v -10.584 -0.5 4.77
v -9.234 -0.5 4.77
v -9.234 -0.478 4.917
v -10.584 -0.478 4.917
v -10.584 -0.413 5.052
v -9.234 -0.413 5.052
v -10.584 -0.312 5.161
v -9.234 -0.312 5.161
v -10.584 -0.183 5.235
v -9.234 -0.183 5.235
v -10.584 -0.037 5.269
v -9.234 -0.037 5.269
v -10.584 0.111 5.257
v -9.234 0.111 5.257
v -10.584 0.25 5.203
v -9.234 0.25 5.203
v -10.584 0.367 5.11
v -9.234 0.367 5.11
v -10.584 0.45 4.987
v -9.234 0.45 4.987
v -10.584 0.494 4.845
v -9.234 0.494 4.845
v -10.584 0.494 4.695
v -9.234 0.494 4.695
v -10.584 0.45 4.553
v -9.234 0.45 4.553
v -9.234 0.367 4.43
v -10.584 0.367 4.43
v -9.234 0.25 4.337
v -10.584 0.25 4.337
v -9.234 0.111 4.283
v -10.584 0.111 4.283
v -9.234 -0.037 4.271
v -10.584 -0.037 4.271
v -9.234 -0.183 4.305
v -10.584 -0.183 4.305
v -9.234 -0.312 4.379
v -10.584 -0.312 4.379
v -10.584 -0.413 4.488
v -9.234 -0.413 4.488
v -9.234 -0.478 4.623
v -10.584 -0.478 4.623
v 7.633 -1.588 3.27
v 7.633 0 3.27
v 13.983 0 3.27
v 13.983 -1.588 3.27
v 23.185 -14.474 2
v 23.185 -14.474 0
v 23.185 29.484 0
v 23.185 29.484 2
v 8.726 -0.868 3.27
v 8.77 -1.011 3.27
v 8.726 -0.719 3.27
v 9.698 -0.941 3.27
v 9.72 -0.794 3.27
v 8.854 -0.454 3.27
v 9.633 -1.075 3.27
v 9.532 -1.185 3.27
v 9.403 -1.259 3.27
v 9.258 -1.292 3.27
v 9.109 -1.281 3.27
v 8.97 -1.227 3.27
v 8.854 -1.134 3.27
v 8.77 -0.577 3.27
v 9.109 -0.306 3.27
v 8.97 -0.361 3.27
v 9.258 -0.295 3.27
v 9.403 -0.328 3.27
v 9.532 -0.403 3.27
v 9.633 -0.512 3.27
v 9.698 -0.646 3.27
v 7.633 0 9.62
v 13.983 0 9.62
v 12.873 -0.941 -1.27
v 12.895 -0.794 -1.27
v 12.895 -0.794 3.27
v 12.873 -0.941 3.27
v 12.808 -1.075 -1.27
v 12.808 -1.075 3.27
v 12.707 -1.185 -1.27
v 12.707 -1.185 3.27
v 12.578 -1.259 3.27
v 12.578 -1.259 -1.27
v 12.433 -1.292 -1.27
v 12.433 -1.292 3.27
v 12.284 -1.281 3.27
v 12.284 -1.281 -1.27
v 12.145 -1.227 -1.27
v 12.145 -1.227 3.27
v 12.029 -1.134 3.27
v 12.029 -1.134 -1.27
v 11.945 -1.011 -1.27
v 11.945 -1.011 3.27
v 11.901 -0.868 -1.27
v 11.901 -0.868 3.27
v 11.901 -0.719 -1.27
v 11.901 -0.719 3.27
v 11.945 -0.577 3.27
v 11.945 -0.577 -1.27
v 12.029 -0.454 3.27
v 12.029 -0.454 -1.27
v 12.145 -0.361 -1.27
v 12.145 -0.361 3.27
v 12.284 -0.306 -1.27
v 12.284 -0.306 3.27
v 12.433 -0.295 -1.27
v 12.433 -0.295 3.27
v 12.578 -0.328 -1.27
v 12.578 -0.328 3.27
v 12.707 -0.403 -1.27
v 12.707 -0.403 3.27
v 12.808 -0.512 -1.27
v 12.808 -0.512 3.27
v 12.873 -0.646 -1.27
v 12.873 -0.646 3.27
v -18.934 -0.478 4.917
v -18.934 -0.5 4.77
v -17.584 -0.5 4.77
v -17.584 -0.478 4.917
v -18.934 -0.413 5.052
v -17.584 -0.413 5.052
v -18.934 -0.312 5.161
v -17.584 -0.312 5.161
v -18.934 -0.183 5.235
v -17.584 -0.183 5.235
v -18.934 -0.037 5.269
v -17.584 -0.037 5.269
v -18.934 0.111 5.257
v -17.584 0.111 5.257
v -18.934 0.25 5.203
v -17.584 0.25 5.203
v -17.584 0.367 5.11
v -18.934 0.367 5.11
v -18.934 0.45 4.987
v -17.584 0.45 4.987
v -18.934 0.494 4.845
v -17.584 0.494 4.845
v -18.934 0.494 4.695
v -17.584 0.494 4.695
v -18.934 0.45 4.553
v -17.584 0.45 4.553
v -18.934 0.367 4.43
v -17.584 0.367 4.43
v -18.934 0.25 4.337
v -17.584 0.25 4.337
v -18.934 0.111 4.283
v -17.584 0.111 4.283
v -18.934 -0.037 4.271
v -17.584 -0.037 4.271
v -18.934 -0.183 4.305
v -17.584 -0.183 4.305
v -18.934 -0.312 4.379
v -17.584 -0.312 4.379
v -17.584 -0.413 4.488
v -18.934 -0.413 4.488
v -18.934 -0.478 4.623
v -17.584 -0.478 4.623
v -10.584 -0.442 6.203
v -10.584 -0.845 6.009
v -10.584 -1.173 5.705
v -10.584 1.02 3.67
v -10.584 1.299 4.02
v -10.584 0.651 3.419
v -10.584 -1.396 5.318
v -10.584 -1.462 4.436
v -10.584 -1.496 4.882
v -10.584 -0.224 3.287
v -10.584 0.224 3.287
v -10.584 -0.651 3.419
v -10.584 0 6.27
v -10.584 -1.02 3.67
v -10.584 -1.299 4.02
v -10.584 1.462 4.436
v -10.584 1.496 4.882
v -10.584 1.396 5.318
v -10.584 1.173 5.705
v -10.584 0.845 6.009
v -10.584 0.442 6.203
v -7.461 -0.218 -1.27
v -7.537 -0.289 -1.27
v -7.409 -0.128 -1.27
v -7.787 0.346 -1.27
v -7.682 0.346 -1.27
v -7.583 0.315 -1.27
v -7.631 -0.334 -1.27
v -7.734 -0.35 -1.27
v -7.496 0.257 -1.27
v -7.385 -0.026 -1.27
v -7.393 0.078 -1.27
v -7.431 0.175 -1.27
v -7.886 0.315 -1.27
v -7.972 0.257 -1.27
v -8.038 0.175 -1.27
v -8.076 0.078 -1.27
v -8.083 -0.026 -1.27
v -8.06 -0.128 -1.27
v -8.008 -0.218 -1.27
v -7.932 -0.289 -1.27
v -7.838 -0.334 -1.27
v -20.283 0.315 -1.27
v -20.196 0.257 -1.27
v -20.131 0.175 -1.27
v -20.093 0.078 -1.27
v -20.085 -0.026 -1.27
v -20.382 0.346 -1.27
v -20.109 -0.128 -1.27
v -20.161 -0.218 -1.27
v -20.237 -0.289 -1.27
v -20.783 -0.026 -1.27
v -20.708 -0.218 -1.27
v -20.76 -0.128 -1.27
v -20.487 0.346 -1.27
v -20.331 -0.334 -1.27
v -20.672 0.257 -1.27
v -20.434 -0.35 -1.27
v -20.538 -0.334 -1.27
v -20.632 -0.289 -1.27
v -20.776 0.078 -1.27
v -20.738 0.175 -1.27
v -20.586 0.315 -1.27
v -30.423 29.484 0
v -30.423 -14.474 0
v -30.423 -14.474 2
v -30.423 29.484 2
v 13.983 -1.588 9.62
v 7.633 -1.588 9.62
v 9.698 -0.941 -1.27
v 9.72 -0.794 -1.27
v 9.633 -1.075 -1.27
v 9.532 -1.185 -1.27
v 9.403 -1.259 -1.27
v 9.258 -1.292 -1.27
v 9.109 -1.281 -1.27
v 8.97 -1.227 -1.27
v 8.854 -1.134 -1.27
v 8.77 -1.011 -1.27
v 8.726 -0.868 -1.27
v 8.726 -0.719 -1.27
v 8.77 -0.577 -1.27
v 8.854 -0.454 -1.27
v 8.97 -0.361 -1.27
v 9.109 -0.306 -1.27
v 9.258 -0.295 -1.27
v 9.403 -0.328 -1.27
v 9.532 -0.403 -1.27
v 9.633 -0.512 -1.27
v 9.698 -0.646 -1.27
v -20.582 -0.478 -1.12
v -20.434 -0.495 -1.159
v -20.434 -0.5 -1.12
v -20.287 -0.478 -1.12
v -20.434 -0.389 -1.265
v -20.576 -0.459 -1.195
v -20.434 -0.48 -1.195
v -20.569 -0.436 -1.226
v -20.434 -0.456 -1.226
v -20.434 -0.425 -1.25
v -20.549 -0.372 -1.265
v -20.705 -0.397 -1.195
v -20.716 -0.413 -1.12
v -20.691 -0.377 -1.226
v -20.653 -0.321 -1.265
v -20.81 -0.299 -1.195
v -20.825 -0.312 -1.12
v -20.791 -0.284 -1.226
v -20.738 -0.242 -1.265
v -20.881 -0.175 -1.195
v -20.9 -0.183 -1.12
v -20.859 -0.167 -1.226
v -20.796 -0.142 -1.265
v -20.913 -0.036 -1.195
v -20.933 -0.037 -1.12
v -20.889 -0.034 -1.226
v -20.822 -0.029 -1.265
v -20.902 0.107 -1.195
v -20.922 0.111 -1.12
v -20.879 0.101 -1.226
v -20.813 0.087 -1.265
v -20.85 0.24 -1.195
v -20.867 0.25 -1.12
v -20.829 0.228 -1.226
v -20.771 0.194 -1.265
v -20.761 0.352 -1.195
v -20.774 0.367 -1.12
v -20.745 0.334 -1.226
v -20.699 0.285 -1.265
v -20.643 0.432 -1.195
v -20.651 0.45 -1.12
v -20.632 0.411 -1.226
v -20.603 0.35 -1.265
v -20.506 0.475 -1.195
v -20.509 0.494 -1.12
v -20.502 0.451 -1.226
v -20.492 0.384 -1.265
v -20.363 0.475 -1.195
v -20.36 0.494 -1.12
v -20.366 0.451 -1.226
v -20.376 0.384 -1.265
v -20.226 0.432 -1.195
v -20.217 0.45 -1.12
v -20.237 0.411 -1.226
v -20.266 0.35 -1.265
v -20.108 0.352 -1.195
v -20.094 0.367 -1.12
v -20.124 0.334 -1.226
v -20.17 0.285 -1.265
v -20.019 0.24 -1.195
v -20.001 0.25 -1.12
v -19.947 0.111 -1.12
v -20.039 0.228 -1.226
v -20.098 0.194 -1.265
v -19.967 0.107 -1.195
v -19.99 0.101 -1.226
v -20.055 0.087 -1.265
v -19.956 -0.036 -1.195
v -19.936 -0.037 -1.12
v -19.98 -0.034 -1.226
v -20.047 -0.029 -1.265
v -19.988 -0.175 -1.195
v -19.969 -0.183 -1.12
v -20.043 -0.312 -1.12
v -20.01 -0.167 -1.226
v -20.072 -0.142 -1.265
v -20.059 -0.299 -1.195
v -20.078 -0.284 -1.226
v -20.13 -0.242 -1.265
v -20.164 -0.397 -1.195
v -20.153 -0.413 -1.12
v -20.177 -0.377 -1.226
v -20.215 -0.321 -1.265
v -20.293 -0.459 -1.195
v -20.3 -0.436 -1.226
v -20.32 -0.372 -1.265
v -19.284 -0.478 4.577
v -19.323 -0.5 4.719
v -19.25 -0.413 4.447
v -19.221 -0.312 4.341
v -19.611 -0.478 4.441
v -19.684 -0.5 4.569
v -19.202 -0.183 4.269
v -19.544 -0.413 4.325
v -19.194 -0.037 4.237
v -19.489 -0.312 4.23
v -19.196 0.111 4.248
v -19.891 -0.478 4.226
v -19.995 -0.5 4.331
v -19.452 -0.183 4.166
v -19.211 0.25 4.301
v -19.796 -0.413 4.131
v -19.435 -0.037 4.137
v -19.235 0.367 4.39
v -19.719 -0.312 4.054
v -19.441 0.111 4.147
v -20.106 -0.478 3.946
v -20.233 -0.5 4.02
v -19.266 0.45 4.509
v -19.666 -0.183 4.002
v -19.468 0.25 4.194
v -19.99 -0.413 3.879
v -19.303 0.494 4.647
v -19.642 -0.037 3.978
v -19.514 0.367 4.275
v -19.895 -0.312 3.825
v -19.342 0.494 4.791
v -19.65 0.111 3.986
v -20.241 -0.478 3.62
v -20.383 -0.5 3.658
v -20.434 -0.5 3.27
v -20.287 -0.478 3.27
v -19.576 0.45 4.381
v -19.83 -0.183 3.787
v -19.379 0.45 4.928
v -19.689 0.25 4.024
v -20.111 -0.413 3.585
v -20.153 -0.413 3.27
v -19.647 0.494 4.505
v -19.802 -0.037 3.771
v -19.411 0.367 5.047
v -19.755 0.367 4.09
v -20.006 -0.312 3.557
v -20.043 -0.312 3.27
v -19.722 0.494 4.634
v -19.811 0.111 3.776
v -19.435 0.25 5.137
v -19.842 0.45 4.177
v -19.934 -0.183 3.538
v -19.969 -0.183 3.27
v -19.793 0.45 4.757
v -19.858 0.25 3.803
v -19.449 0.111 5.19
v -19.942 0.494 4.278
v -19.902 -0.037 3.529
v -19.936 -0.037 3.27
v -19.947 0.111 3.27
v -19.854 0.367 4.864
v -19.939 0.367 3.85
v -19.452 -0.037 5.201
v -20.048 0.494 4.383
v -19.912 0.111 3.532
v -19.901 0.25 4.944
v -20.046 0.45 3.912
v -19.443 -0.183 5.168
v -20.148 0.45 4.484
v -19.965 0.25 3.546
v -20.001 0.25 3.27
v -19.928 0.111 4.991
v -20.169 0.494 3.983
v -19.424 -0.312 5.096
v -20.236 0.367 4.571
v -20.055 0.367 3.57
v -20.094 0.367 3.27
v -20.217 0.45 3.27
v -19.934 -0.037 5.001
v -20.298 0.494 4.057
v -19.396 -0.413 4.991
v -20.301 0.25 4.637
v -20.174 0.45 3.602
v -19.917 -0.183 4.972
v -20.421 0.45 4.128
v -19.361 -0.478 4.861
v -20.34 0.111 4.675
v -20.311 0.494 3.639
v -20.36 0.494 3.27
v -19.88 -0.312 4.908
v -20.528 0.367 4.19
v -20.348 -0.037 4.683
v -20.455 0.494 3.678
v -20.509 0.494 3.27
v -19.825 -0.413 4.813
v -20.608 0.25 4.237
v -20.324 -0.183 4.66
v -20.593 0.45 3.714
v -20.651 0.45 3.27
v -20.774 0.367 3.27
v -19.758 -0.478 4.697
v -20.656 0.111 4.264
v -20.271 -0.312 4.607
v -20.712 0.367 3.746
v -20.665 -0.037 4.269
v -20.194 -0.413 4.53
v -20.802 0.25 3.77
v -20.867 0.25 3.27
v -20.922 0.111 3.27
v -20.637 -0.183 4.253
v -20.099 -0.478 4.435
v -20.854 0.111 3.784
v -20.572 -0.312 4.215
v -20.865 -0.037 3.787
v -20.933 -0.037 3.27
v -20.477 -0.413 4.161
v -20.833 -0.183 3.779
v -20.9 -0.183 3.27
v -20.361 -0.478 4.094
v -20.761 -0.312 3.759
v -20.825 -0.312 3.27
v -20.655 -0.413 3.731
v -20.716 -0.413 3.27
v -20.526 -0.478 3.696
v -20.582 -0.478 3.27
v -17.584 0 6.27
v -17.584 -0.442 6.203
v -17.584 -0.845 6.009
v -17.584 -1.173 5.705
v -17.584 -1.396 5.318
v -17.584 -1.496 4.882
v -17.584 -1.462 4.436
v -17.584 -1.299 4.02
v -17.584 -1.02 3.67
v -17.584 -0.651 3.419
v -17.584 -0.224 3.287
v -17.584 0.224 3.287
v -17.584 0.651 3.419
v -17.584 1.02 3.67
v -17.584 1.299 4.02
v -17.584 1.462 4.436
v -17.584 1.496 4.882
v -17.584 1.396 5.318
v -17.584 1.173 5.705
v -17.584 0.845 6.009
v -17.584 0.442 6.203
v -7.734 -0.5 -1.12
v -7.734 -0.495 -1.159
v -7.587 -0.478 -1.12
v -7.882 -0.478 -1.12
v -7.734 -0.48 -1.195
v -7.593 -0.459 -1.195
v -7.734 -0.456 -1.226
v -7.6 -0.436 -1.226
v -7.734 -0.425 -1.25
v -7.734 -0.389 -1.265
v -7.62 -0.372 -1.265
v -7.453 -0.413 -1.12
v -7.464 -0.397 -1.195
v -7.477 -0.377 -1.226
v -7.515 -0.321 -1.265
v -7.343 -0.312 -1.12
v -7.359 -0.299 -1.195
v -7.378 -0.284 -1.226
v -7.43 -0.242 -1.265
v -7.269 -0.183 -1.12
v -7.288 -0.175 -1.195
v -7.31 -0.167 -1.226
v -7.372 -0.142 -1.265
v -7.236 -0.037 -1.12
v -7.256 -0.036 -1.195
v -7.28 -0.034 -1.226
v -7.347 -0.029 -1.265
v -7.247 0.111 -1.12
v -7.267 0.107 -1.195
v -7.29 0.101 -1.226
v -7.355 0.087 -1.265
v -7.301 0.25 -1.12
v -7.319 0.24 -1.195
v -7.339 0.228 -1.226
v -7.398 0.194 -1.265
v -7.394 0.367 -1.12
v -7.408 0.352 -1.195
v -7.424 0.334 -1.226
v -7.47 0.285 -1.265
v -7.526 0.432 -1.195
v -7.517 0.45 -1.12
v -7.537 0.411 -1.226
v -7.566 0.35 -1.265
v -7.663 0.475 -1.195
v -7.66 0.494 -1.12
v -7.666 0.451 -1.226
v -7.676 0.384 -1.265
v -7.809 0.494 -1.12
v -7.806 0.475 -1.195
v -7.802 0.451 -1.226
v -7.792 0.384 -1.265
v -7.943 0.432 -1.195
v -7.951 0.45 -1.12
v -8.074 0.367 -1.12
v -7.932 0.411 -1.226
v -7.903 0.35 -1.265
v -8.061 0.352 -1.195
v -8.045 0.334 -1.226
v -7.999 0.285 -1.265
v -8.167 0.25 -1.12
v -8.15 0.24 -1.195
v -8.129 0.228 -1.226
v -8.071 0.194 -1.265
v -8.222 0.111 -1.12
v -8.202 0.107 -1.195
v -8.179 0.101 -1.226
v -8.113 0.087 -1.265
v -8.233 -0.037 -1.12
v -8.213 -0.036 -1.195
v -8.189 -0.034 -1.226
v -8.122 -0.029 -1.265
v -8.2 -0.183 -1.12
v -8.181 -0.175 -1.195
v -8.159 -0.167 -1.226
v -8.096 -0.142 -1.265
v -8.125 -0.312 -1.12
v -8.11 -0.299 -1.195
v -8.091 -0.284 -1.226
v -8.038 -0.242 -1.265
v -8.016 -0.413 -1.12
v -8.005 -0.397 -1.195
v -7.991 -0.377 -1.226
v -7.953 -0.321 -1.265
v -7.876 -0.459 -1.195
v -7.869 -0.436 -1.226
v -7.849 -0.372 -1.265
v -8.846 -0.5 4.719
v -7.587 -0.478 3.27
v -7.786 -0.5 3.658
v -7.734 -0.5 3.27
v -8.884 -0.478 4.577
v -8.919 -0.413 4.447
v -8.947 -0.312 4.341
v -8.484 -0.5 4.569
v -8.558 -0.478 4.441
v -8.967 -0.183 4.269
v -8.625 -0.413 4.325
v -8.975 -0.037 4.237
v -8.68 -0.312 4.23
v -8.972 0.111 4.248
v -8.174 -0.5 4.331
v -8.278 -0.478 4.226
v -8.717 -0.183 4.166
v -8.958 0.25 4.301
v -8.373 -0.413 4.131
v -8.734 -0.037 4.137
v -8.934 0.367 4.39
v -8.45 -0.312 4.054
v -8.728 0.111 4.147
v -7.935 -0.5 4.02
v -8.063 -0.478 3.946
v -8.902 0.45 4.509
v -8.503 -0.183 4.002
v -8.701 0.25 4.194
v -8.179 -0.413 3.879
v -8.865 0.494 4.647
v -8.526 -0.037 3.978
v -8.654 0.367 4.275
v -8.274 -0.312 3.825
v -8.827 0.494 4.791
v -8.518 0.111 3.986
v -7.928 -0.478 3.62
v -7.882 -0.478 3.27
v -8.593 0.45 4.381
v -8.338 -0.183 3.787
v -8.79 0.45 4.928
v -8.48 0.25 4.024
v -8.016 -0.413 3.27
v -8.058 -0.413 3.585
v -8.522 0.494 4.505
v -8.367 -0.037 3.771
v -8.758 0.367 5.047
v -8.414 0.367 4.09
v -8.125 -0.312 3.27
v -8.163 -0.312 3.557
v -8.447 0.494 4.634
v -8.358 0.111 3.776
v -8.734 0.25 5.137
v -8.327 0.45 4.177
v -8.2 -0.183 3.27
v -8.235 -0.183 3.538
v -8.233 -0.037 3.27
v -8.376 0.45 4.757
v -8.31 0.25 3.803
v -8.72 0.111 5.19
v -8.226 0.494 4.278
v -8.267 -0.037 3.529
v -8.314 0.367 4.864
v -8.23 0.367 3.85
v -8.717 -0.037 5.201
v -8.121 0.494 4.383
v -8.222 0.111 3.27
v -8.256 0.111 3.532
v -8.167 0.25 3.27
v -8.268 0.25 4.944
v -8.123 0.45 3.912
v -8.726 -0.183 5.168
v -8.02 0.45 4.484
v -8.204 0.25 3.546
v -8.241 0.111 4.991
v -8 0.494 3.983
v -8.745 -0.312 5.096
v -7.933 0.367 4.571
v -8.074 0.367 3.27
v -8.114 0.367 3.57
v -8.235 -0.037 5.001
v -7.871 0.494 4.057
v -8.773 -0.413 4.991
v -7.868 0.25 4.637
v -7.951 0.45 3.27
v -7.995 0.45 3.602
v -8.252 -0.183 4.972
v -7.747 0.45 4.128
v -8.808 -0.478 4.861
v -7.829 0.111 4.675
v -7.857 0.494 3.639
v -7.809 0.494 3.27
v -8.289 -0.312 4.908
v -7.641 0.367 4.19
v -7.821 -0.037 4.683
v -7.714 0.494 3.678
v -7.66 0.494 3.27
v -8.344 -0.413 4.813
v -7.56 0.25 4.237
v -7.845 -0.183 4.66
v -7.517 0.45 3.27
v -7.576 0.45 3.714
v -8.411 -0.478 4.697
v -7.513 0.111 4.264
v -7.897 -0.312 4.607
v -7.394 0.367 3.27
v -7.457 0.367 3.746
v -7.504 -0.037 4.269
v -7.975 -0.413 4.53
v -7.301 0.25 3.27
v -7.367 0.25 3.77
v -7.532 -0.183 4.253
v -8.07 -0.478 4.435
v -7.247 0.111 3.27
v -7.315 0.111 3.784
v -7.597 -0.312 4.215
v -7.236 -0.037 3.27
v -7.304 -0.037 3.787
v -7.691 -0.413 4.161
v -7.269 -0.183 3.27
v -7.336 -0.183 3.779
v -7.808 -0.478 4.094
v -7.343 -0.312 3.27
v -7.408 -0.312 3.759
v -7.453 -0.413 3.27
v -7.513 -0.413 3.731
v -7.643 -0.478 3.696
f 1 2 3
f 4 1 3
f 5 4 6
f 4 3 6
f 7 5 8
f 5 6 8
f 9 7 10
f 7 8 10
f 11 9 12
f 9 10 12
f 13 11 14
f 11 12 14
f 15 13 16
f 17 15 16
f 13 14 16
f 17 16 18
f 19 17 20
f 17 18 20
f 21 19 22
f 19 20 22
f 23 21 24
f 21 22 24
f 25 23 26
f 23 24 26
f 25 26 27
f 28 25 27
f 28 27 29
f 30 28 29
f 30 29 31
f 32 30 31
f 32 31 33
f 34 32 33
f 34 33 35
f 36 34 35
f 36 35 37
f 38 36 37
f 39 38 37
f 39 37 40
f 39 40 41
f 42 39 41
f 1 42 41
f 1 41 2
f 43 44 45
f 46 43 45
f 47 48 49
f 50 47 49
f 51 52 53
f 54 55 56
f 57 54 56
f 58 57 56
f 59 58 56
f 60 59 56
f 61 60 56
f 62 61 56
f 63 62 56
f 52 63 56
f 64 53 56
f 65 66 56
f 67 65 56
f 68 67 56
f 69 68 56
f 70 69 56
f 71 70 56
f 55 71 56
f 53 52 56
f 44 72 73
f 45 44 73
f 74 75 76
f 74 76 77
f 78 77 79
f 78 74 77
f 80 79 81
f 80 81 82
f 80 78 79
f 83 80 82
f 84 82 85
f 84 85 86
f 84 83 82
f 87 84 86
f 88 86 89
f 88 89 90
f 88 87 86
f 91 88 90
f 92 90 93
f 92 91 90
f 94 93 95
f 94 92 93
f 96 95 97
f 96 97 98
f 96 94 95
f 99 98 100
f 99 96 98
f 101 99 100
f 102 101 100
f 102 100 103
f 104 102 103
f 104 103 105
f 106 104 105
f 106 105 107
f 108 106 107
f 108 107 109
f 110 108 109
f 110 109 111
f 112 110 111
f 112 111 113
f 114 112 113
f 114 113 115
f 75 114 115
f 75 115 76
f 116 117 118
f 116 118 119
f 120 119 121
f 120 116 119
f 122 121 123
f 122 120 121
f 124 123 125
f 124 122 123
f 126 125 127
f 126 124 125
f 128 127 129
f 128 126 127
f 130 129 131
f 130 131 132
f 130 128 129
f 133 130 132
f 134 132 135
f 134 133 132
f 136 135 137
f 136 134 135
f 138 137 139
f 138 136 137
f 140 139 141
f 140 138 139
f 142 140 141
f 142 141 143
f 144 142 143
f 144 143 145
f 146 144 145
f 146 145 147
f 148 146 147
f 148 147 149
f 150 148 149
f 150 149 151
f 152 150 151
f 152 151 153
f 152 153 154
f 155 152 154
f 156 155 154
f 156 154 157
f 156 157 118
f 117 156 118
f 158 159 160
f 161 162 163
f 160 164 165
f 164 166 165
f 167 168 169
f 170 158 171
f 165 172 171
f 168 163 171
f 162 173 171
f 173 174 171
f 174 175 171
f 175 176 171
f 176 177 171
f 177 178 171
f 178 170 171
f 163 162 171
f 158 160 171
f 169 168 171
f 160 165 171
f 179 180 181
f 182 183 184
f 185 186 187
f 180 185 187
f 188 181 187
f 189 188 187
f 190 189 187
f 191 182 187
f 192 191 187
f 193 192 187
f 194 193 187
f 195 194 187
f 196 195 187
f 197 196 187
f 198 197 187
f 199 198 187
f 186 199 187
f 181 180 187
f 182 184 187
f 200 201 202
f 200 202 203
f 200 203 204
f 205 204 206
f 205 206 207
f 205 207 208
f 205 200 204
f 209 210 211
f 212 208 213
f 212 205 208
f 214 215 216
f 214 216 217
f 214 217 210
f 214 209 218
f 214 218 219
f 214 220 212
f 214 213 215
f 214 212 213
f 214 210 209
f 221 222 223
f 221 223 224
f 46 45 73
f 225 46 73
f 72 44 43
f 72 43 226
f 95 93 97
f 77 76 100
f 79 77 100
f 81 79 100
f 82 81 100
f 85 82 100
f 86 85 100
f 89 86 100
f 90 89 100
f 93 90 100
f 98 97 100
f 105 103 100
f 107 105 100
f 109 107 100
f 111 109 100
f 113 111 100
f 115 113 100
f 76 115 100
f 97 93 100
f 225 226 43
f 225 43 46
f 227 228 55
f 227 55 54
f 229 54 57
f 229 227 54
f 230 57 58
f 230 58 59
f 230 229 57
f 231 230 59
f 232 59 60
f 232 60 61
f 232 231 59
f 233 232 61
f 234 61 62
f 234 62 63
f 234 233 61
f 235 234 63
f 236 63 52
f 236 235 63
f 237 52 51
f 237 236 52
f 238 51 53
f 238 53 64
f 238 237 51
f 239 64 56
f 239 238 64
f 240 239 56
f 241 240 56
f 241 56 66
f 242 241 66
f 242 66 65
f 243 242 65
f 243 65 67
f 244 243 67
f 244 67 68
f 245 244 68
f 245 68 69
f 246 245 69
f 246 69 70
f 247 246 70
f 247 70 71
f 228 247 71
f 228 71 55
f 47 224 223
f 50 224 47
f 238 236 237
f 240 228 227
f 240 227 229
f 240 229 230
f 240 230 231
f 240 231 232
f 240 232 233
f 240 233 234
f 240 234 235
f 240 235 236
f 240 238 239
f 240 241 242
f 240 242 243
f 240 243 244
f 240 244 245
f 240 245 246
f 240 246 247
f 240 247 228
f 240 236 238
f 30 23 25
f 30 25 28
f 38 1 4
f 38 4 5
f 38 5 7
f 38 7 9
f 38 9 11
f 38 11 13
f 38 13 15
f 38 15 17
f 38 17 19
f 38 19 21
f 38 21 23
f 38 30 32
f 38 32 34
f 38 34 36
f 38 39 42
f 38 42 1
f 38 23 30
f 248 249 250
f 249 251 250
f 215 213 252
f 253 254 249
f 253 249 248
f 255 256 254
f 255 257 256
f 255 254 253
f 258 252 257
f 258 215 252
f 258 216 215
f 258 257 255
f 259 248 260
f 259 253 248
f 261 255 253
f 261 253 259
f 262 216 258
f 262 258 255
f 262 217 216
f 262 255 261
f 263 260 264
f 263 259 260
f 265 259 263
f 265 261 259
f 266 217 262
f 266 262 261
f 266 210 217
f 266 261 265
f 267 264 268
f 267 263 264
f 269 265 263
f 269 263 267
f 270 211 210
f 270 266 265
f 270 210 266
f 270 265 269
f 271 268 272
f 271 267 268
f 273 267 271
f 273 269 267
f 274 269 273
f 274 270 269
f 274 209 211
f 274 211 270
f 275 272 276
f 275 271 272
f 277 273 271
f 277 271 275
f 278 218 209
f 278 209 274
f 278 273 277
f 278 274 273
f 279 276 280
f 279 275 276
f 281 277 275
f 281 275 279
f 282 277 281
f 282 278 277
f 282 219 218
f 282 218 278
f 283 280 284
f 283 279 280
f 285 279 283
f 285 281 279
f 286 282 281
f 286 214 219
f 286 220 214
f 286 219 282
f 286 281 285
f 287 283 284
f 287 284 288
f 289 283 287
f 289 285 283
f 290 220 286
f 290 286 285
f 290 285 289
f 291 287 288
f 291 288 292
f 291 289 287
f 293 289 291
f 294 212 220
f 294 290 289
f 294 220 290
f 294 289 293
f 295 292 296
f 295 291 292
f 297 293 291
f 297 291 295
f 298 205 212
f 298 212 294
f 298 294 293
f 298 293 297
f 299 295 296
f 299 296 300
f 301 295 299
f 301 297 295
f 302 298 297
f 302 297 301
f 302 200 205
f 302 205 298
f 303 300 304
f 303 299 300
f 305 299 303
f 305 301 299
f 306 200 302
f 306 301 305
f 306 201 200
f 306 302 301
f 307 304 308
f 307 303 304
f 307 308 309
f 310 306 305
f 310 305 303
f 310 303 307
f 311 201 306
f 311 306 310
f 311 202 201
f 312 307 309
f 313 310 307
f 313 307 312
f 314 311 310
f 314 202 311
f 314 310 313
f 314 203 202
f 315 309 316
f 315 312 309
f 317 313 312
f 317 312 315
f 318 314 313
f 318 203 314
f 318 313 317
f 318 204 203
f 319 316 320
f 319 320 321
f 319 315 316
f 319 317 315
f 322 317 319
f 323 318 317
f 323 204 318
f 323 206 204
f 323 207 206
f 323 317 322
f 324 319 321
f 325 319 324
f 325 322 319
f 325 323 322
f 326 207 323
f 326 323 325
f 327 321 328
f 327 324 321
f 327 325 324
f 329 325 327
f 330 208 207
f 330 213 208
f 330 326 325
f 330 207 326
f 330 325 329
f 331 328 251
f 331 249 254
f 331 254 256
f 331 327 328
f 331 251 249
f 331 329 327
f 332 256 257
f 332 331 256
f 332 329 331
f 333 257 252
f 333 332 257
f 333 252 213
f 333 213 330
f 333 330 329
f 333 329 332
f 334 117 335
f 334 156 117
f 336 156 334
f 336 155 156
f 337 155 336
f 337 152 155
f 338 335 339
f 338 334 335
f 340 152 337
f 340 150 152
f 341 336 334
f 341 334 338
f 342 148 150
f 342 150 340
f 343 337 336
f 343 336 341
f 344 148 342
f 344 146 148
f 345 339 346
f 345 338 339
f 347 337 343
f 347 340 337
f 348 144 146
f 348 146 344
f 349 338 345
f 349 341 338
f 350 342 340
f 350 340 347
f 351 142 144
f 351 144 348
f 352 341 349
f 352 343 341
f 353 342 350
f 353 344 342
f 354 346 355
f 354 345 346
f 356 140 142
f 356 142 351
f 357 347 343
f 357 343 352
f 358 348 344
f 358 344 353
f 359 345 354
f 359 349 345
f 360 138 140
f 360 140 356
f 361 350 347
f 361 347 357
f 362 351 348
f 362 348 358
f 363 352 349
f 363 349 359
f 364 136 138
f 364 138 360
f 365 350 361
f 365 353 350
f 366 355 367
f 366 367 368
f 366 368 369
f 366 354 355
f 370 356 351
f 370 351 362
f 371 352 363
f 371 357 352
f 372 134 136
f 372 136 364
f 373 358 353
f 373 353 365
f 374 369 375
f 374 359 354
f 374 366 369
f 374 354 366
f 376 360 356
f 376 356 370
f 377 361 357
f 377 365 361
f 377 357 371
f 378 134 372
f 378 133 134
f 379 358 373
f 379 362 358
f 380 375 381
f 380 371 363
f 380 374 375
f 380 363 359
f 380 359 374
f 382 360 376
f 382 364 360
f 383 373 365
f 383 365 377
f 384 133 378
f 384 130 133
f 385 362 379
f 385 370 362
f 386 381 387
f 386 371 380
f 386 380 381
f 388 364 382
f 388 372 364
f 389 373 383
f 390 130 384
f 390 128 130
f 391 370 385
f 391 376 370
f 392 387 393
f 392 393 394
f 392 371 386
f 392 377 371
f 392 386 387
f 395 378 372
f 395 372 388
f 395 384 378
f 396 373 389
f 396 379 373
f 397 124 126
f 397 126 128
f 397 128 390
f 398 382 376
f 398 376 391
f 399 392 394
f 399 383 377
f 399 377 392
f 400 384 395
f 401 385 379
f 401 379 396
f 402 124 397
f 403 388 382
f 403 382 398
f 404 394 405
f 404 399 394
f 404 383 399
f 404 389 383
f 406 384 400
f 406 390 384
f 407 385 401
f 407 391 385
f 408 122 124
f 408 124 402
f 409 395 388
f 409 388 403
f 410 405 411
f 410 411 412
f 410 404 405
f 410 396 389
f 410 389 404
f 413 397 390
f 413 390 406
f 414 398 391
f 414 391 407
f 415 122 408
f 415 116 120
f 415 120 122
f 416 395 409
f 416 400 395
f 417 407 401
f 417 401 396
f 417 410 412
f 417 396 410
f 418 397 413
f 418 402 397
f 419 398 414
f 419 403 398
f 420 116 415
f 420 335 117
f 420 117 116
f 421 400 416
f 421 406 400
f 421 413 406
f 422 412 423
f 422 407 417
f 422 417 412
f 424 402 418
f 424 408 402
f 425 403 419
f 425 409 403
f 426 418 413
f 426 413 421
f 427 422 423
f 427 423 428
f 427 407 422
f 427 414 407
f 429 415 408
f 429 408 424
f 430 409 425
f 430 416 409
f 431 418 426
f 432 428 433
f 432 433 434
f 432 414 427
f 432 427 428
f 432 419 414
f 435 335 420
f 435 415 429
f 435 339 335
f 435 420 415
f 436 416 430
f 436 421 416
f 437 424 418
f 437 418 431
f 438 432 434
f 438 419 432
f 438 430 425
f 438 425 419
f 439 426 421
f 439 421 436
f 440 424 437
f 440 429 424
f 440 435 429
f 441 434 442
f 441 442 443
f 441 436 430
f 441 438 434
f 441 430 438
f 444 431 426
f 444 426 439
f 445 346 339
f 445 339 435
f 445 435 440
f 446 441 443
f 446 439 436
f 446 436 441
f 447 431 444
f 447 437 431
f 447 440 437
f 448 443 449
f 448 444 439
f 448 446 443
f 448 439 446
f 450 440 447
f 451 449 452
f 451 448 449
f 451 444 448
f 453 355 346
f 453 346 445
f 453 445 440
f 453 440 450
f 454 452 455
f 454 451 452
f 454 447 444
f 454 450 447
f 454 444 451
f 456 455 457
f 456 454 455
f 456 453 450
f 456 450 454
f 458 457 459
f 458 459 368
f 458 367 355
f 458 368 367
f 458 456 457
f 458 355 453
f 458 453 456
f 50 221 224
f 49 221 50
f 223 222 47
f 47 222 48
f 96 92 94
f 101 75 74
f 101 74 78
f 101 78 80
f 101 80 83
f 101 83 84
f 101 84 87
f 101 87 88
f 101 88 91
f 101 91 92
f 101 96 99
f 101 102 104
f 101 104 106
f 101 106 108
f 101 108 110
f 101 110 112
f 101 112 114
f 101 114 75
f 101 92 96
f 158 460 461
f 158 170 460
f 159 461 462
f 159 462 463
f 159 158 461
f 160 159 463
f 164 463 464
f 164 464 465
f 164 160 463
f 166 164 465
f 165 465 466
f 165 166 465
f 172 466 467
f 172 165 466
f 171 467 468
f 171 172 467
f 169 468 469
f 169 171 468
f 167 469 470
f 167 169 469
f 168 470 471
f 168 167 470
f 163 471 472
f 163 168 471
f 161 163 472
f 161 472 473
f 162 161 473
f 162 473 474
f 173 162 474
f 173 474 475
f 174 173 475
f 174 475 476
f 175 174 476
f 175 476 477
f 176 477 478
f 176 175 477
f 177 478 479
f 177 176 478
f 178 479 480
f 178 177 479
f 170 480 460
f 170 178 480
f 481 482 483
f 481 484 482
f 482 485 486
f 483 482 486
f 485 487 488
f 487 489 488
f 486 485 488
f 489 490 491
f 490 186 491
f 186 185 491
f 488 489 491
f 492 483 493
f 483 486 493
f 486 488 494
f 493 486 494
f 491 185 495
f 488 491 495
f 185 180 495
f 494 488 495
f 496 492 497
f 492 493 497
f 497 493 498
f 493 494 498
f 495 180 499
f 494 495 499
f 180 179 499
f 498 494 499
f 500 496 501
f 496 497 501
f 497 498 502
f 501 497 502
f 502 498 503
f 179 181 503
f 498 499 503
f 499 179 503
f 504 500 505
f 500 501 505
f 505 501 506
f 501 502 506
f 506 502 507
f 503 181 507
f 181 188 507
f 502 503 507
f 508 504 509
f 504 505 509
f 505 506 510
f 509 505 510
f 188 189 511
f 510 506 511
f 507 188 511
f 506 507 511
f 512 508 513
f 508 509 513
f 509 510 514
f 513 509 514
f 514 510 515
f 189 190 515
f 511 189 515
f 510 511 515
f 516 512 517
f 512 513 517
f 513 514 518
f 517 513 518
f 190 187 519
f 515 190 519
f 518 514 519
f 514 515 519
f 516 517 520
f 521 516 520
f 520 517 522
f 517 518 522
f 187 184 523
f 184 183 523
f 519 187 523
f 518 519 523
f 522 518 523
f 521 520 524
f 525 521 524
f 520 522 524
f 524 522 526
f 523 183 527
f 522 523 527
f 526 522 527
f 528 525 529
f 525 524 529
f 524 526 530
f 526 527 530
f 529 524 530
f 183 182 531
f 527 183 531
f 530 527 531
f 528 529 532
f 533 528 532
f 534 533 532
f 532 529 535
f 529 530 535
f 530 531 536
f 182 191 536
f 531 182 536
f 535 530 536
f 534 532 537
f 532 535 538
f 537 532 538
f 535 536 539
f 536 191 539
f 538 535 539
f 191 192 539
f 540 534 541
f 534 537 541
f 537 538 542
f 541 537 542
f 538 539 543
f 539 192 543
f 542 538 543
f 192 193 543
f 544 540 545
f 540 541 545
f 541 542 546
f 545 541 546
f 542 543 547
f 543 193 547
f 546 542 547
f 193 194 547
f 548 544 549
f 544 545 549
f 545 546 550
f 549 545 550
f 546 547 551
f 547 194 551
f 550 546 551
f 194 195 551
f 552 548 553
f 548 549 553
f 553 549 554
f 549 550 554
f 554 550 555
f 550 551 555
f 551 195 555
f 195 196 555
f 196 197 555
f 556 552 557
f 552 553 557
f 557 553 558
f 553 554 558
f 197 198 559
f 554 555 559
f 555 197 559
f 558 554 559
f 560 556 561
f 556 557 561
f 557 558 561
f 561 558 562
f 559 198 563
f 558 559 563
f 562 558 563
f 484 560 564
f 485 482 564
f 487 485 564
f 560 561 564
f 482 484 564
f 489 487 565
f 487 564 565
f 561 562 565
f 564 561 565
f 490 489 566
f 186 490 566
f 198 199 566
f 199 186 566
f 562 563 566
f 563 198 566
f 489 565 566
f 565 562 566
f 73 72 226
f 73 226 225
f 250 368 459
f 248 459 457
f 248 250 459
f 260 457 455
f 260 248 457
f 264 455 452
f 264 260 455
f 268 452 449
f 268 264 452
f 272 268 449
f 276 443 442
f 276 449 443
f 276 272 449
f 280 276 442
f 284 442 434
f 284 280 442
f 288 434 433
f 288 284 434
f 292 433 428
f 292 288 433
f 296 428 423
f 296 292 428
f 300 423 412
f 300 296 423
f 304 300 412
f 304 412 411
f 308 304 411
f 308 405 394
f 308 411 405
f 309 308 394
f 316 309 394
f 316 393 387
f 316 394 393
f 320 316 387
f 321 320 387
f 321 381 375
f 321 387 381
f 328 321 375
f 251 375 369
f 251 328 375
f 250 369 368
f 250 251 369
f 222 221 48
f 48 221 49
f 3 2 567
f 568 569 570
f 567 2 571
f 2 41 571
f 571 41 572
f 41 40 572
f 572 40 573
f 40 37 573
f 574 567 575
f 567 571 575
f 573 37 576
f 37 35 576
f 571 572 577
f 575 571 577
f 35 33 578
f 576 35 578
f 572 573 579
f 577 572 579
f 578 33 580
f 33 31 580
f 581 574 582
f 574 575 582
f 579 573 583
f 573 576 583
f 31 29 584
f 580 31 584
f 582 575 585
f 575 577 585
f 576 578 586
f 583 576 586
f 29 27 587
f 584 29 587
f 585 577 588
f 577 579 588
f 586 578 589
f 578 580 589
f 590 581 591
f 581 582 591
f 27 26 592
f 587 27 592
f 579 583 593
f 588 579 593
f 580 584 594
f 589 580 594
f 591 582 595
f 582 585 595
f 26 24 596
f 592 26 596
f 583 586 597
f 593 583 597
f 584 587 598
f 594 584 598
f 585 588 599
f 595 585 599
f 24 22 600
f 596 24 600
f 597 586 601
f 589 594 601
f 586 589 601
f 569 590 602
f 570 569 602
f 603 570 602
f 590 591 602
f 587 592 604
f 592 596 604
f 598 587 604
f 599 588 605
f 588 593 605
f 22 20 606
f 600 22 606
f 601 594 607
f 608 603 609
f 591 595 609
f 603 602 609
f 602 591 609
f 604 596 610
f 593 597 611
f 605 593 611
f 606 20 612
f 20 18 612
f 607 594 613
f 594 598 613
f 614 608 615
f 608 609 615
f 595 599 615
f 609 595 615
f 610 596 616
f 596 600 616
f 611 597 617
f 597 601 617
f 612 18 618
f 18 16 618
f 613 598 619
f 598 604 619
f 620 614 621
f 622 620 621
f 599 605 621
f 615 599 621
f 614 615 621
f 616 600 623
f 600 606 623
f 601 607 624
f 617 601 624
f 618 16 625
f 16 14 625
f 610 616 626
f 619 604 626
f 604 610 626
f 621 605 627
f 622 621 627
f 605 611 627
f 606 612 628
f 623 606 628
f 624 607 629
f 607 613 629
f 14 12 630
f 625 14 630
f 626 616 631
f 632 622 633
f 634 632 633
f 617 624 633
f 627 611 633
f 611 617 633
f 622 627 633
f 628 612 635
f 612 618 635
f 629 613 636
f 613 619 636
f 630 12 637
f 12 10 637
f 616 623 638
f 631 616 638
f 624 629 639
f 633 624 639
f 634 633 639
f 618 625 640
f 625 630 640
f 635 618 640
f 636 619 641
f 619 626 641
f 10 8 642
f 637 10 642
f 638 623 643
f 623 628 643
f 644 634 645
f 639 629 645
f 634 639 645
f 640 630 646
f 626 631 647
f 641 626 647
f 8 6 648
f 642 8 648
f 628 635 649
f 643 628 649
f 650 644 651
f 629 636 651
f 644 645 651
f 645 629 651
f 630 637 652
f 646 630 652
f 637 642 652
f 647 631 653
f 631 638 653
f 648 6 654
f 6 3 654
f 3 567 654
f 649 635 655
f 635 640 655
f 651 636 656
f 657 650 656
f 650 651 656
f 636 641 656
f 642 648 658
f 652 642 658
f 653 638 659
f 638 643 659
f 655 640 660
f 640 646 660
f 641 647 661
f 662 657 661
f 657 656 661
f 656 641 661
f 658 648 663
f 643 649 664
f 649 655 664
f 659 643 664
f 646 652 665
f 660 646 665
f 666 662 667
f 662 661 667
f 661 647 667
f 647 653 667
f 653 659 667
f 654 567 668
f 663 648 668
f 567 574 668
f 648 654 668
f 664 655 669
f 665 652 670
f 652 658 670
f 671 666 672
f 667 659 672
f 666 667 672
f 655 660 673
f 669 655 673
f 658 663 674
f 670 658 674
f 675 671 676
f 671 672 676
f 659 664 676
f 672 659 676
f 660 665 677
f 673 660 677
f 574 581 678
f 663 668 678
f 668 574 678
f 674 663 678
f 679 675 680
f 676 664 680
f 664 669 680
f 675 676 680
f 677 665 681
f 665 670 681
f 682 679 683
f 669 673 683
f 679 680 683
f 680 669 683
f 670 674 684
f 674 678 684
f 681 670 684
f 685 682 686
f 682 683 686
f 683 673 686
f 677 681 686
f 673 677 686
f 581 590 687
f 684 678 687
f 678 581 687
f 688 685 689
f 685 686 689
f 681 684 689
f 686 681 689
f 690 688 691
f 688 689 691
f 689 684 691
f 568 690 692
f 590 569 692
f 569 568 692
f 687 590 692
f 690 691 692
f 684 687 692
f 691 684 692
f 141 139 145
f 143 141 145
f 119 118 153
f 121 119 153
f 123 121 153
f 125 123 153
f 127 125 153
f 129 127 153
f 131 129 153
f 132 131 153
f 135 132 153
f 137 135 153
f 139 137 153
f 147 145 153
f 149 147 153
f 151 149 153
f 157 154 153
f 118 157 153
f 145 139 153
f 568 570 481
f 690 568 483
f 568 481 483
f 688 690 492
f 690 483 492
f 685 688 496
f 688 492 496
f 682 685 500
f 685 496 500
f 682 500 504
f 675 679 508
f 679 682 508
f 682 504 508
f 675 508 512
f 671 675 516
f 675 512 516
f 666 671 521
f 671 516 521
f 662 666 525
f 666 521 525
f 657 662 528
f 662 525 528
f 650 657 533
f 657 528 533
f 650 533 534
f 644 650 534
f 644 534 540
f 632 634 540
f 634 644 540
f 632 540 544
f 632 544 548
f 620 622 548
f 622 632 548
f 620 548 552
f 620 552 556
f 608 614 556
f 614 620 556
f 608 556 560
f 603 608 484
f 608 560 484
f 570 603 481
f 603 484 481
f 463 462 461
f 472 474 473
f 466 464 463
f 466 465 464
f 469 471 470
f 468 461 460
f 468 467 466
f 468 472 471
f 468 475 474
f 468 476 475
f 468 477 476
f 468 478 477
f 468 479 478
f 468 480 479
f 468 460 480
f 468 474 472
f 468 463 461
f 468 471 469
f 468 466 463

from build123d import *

# Parameters (mm, degrees)
F0_W      = 53.608039394
F0_H      = 43.9585913264
F1_DEPTH  = 2
F2_W      = 7
F2_H      = 1.5
F4_R      = 0.5
F7_R      = 0.15
F10_W     = 6.35
F10_H     = 6.35
F11_DEPTH = 1.5875
F12_R     = 0.5


# Not quite as in the source:
# - a length typed as a fraction of an inch, garbled in the dataset ("3 / 203.2 mm" for 3/8 in), is restored


with BuildPart() as f1:
    # F0 (on Top) → F1 (new body)
    with BuildSketch(Plane.XY):
        with Locations((-3.6185430363, 7.5051253516)):
            Rectangle(F0_W, F0_H)
    extrude(amount=F1_DEPTH)


with BuildPart() as f3:
    # F2 (on Front) → F3 (revolve)
    with BuildSketch(Plane.XZ):
        with Locations((-14.0843965262, 5.52)):
            Rectangle(F2_W, F2_H)
    revolve(axis=Axis((-14.0843965262, 0, 4.77), (1, 0, 0)))


with BuildPart() as f6:
    # F6: sweep along a path in F5
    with BuildLine(Plane.XZ) as f6_path:
        Line((-17.5843965262, 4.77), (-18.9343965262, 4.77))
        ThreePointArc((-18.9343965262, 4.77), (-19.995056698, 4.3306601718), (-20.4343965262, 3.27))
        Line((-20.4343965262, 3.27), (-20.4343965262, -1.27))
    # F4 (on face) → F6 (sweep)
    with BuildSketch(Plane(origin=(-17.5843965262, 0, 0), x_dir=(0, -1, 0), z_dir=(-1, 0, 0))):
        with Locations((0, 4.77)):
            Circle(F4_R)
    sweep(path=f6_path.line)

    # F7
    f7_edges = [f6.edges().sort_by_distance(p)[0] for p in [
        (-20.434397, 0.5, -1.27),
    ]]
    fillet(f7_edges, radius=F7_R)


with BuildPart() as f9_1:
    # F9: instance of F6
    add(f6.part.mirror(Plane(origin=(-14.0843965262, 0, 0), x_dir=(0, -1, 0), z_dir=(-1, 0, 0))))


with BuildPart() as f11:
    # F10 (on Front) → F11 (new body)
    with BuildSketch(Plane.XZ):
        with Locations((10.8077574987, 6.445)):
            Rectangle(F10_W, F10_H)
    extrude(amount=F11_DEPTH)


with BuildPart() as f14:
    # F14: sweep along a path in F13
    with BuildLine(Plane.XZ) as f14_path:
        Line((9.2202574987, 3.27), (9.2202574987, -1.27))
    # F12 (on face) → F14 (sweep)
    with BuildSketch(Plane(origin=(0, 0, 3.27), x_dir=(1, 0, 0), z_dir=(0, 0, -1))):
        with Locations((9.2202574987, 0.79375)):
            Circle(F12_R)
        with Locations((12.3952574987, 0.79375)):
            Circle(F12_R)
    sweep(path=f14_path.line)


solid = Compound([f1.part, f3.part, f6.part, f9_1.part, f11.part, f14.part])
